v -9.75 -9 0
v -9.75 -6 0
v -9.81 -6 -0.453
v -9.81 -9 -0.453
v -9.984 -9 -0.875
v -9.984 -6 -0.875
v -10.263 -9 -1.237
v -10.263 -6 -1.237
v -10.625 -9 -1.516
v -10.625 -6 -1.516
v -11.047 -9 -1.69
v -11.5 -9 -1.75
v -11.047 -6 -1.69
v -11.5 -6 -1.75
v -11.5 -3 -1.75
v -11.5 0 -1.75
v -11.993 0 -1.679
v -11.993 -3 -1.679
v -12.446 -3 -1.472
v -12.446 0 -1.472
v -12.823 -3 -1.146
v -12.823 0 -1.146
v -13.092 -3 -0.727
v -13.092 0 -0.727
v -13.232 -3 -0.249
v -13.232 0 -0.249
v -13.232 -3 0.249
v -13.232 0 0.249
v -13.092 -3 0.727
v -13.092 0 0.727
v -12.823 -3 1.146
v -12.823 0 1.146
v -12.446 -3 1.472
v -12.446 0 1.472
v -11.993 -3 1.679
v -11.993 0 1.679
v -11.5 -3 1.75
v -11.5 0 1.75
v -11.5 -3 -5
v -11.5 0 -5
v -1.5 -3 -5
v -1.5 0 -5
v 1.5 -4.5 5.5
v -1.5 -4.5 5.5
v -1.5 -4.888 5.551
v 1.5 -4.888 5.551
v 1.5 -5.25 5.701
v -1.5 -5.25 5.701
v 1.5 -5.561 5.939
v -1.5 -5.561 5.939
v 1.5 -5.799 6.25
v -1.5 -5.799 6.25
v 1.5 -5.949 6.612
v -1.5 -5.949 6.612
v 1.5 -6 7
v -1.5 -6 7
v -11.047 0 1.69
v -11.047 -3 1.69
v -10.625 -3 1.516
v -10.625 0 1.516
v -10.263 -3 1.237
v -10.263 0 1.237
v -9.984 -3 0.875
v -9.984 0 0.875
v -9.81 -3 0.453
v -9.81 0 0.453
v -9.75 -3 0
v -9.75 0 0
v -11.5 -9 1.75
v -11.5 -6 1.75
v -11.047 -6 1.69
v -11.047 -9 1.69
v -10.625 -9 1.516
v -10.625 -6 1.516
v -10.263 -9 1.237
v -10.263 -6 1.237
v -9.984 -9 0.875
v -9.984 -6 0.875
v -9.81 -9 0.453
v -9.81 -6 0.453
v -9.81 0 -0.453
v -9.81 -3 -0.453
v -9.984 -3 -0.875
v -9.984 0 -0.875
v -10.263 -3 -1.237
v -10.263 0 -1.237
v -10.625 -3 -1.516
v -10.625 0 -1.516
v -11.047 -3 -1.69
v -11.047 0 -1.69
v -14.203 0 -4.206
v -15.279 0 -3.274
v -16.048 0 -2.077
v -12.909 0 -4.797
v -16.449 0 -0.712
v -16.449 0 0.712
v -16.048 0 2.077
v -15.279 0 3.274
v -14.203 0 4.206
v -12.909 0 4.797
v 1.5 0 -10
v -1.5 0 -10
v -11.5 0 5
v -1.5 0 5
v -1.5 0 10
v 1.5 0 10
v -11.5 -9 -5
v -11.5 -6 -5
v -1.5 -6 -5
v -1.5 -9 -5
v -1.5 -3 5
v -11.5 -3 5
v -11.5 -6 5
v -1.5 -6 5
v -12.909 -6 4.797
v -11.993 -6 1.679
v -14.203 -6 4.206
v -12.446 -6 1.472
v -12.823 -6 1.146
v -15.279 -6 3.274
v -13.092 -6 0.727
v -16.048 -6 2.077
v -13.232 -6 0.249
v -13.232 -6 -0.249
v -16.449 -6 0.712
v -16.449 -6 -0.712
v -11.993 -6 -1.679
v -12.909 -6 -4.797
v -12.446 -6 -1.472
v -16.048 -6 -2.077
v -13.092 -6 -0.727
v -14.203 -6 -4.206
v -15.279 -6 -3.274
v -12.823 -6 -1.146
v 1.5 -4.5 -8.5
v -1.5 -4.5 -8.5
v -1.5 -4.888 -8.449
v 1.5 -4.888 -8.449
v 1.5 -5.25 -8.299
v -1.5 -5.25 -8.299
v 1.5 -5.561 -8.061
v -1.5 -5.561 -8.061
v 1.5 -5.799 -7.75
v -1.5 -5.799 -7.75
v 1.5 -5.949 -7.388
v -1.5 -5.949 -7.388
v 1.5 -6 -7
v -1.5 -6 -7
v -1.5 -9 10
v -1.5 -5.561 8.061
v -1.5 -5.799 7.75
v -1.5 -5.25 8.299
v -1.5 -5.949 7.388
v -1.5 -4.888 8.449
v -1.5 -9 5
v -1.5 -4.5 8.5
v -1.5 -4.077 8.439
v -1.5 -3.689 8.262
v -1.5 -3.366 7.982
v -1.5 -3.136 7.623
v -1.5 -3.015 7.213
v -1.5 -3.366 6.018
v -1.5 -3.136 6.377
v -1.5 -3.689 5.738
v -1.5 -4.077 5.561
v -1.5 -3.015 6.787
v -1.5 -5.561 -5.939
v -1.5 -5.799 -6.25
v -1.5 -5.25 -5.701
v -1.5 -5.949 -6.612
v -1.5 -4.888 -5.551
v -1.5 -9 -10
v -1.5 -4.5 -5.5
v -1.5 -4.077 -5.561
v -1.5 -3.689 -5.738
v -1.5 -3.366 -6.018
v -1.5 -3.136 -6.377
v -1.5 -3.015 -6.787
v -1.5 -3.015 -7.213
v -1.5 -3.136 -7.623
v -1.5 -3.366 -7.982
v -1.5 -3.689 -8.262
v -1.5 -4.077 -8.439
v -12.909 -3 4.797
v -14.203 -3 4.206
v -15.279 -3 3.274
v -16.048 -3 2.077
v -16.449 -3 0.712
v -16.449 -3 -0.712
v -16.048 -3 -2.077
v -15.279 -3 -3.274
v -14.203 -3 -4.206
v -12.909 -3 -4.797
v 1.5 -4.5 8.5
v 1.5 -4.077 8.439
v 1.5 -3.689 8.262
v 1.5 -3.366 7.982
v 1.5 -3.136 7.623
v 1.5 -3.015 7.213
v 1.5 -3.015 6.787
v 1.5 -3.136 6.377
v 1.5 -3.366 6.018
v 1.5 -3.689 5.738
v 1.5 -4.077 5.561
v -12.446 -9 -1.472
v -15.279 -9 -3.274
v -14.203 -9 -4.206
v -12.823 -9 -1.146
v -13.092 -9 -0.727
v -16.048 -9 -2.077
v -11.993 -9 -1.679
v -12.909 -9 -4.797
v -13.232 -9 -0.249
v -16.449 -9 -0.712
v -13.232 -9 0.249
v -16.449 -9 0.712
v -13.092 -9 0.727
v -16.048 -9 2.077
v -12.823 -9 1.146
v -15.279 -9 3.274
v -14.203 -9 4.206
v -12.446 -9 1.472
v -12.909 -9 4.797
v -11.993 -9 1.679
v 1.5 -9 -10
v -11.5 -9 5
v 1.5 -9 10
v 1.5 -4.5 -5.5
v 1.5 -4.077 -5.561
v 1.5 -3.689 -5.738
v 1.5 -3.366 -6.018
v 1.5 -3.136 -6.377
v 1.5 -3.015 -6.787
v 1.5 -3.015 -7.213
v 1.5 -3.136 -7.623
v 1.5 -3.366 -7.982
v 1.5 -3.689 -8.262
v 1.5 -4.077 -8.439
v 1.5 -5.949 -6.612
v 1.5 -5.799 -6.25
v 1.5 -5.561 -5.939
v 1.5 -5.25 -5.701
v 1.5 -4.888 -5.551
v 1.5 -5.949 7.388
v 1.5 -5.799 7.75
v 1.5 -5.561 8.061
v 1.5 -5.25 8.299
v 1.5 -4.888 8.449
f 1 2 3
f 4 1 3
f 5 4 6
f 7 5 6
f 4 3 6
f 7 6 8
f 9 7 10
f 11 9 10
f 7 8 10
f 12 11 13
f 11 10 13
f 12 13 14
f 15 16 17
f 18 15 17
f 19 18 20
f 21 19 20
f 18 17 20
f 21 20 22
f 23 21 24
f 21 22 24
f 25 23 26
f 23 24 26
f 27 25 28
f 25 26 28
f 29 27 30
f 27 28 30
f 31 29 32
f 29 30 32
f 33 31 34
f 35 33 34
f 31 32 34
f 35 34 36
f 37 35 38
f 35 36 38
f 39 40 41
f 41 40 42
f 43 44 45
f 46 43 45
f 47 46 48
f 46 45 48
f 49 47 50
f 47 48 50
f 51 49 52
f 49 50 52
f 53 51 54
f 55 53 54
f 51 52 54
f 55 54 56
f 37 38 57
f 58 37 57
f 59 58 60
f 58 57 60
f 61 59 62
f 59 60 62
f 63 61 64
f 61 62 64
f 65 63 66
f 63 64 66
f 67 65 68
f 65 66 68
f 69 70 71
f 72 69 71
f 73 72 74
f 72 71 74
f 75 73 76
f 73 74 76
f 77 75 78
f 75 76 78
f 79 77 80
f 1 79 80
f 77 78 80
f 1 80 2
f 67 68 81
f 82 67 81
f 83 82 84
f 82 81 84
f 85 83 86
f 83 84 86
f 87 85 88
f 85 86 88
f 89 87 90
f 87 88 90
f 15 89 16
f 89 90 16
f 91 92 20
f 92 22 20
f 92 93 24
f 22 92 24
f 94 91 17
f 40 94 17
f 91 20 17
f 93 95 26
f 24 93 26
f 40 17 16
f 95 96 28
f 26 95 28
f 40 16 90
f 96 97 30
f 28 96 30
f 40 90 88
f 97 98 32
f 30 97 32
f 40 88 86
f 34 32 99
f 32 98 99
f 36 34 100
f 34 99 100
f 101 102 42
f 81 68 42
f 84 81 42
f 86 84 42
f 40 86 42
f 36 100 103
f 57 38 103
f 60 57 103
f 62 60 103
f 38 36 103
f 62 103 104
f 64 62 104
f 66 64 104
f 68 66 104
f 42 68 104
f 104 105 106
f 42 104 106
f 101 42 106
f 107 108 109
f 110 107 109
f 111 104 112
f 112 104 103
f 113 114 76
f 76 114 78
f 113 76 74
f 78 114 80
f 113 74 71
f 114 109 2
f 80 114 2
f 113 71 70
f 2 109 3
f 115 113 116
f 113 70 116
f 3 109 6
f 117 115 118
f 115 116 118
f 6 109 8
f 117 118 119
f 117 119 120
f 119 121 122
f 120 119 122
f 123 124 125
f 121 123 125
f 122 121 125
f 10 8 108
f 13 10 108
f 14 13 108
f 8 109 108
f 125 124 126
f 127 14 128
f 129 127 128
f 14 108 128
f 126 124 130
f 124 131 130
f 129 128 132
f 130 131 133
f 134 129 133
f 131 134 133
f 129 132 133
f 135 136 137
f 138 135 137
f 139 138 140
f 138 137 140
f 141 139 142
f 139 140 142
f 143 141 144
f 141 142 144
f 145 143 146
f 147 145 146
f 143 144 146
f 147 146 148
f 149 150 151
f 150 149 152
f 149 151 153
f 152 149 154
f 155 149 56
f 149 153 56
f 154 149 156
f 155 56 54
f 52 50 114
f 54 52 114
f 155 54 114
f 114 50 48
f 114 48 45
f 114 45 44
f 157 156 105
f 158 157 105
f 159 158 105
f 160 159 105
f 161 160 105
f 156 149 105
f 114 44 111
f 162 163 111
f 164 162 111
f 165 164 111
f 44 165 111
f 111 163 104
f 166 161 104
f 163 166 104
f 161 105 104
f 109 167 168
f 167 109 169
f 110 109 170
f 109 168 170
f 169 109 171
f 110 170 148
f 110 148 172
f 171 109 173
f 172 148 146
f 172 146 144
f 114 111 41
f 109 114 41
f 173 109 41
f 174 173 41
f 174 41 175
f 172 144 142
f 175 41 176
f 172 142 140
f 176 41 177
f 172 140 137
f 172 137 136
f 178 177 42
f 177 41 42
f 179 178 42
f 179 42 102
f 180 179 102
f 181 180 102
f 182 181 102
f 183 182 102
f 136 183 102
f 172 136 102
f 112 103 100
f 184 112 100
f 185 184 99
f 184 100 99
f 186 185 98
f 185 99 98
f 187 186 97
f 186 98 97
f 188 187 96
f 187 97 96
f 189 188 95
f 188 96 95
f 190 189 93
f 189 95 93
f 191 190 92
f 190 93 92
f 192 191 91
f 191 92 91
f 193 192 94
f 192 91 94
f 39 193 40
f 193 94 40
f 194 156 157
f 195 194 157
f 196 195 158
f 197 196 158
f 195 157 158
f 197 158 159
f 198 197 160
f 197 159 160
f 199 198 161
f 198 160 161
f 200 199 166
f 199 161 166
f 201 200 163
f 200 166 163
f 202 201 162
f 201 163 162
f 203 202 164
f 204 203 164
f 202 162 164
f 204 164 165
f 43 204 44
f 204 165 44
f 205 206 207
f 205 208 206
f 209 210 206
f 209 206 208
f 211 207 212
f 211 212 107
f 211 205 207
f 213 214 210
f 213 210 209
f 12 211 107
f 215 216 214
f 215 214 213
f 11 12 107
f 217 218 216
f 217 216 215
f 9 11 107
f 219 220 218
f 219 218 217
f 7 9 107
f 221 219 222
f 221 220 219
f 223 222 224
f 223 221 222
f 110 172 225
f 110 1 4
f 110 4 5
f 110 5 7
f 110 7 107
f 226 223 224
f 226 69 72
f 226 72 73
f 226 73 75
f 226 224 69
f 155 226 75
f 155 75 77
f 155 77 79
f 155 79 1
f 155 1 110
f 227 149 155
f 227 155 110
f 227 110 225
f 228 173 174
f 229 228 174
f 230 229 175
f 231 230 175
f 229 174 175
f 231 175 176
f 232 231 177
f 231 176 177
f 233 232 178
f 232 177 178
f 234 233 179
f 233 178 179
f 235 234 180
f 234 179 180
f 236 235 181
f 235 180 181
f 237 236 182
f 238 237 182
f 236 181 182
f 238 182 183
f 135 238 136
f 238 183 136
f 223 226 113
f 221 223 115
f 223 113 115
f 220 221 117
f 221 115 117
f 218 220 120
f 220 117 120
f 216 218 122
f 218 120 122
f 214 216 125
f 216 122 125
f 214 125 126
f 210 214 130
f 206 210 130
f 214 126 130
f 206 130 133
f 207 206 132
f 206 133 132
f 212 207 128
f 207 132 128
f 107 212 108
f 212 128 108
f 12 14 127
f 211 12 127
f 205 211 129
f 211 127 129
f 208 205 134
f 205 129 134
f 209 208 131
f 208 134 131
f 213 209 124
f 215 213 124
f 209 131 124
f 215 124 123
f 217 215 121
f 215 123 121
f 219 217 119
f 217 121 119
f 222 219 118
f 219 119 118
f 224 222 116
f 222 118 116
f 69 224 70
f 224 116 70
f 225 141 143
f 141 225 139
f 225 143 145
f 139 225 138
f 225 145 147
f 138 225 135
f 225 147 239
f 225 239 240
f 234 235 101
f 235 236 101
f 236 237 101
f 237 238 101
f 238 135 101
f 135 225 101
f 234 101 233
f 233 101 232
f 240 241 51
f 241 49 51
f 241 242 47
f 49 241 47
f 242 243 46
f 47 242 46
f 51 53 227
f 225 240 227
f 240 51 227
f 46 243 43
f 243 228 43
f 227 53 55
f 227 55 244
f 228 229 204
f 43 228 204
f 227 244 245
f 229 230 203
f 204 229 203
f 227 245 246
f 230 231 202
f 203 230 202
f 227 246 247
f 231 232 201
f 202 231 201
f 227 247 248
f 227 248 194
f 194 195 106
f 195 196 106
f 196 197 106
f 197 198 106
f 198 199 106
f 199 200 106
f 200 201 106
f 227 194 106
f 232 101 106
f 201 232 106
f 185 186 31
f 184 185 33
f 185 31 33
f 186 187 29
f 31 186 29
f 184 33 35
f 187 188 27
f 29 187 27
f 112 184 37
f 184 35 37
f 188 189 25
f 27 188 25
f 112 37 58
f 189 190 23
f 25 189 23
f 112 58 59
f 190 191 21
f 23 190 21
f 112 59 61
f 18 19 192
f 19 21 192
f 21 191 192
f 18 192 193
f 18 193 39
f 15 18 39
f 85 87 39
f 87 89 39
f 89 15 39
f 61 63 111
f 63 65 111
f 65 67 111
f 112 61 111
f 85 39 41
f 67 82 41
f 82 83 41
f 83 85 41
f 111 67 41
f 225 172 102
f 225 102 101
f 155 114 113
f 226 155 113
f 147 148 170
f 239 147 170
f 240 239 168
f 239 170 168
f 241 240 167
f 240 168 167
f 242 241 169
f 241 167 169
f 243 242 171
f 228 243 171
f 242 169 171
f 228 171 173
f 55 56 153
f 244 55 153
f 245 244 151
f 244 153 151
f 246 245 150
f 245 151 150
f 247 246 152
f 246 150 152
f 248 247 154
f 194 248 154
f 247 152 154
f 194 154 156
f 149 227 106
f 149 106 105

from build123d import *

# Parameters (mm, degrees)
F1_DEPTH = 9
F2_W     = 10
F2_H     = 3
F2_W_2   = 6
F3_DEPTH = 11.5
F5_DEPTH = 3


with BuildPart() as f1:
    # F0 (on Front) → F1 (new body)
    with BuildSketch(Plane.XZ):
        Polygon((-1.5, -10), (1.5, -10), (1.5, 10), (-1.5, 10), (-1.5, 5), (-1.5, 0), (-1.5, -5), align=None)
        with BuildLine():
            ThreePointArc((-11.5, 5), (-16.5, 0), (-11.5, -5))
            Line((-11.5, -5), (-11.5, -1.75))
            ThreePointArc((-11.5, -1.75), (-13.25, 0), (-11.5, 1.75))
            Line((-11.5, 1.75), (-11.5, 5))
        make_face()
        with BuildLine():
            Line((-11.5, -5), (-1.5, -5))
            Line((-1.5, -5), (-1.5, 0))
            Line((-1.5, 0), (-1.5, 5))
            Line((-1.5, 5), (-11.5, 5))
            Line((-11.5, 5), (-11.5, 1.75))
            ThreePointArc((-11.5, 1.75), (-10.2625631329, 1.2374368671), (-9.75, 0))
            ThreePointArc((-9.75, 0), (-10.2625631329, -1.2374368671), (-11.5, -1.75))
            Line((-11.5, -1.75), (-11.5, -5))
        make_face()
    extrude(amount=F1_DEPTH)

    # F2 (on face) → F3 (cut)
    with BuildSketch(Plane(origin=(0, 0, -5), x_dir=(1, 0, 0), z_dir=(0, 0, -1))):
        with Locations((-6.5, 4.5)):
            Rectangle(F2_W, F2_H)
        with Locations((-14.5, 4.5)):
            Rectangle(F2_W_2, F2_H)
    extrude(amount=-F3_DEPTH, mode=Mode.SUBTRACT)

    # F4 (on face) → F5 (cut)
    with BuildSketch(Plane(origin=(-1.5, 0, 0), x_dir=(0, -1, 0), z_dir=(-1, 0, 0))):
        with BuildLine():
            ThreePointArc((4.5, -5.5), (3, -7), (4.5, -8.5))
            Line((4.5, -8.5), (4.5, -5.5))
        make_face()
        with BuildLine():
            Line((4.5, -5.5), (4.5, -8.5))
            ThreePointArc((4.5, -8.5), (5.5606601718, -8.0606601718), (6, -7))
            ThreePointArc((6, -7), (5.5606601718, -5.9393398282), (4.5, -5.5))
        make_face()
        with BuildLine():
            ThreePointArc((4.5, 8.5), (3, 7), (4.5, 5.5))
            Line((4.5, 5.5), (4.5, 8.5))
        make_face()
        with BuildLine():
            Line((4.5, 8.5), (4.5, 5.5))
            ThreePointArc((4.5, 5.5), (5.5606601718, 5.9393398282), (6, 7))
            ThreePointArc((6, 7), (5.5606601718, 8.0606601718), (4.5, 8.5))
        make_face()
    extrude(amount=-F5_DEPTH, mode=Mode.SUBTRACT)


solid = f1.part
